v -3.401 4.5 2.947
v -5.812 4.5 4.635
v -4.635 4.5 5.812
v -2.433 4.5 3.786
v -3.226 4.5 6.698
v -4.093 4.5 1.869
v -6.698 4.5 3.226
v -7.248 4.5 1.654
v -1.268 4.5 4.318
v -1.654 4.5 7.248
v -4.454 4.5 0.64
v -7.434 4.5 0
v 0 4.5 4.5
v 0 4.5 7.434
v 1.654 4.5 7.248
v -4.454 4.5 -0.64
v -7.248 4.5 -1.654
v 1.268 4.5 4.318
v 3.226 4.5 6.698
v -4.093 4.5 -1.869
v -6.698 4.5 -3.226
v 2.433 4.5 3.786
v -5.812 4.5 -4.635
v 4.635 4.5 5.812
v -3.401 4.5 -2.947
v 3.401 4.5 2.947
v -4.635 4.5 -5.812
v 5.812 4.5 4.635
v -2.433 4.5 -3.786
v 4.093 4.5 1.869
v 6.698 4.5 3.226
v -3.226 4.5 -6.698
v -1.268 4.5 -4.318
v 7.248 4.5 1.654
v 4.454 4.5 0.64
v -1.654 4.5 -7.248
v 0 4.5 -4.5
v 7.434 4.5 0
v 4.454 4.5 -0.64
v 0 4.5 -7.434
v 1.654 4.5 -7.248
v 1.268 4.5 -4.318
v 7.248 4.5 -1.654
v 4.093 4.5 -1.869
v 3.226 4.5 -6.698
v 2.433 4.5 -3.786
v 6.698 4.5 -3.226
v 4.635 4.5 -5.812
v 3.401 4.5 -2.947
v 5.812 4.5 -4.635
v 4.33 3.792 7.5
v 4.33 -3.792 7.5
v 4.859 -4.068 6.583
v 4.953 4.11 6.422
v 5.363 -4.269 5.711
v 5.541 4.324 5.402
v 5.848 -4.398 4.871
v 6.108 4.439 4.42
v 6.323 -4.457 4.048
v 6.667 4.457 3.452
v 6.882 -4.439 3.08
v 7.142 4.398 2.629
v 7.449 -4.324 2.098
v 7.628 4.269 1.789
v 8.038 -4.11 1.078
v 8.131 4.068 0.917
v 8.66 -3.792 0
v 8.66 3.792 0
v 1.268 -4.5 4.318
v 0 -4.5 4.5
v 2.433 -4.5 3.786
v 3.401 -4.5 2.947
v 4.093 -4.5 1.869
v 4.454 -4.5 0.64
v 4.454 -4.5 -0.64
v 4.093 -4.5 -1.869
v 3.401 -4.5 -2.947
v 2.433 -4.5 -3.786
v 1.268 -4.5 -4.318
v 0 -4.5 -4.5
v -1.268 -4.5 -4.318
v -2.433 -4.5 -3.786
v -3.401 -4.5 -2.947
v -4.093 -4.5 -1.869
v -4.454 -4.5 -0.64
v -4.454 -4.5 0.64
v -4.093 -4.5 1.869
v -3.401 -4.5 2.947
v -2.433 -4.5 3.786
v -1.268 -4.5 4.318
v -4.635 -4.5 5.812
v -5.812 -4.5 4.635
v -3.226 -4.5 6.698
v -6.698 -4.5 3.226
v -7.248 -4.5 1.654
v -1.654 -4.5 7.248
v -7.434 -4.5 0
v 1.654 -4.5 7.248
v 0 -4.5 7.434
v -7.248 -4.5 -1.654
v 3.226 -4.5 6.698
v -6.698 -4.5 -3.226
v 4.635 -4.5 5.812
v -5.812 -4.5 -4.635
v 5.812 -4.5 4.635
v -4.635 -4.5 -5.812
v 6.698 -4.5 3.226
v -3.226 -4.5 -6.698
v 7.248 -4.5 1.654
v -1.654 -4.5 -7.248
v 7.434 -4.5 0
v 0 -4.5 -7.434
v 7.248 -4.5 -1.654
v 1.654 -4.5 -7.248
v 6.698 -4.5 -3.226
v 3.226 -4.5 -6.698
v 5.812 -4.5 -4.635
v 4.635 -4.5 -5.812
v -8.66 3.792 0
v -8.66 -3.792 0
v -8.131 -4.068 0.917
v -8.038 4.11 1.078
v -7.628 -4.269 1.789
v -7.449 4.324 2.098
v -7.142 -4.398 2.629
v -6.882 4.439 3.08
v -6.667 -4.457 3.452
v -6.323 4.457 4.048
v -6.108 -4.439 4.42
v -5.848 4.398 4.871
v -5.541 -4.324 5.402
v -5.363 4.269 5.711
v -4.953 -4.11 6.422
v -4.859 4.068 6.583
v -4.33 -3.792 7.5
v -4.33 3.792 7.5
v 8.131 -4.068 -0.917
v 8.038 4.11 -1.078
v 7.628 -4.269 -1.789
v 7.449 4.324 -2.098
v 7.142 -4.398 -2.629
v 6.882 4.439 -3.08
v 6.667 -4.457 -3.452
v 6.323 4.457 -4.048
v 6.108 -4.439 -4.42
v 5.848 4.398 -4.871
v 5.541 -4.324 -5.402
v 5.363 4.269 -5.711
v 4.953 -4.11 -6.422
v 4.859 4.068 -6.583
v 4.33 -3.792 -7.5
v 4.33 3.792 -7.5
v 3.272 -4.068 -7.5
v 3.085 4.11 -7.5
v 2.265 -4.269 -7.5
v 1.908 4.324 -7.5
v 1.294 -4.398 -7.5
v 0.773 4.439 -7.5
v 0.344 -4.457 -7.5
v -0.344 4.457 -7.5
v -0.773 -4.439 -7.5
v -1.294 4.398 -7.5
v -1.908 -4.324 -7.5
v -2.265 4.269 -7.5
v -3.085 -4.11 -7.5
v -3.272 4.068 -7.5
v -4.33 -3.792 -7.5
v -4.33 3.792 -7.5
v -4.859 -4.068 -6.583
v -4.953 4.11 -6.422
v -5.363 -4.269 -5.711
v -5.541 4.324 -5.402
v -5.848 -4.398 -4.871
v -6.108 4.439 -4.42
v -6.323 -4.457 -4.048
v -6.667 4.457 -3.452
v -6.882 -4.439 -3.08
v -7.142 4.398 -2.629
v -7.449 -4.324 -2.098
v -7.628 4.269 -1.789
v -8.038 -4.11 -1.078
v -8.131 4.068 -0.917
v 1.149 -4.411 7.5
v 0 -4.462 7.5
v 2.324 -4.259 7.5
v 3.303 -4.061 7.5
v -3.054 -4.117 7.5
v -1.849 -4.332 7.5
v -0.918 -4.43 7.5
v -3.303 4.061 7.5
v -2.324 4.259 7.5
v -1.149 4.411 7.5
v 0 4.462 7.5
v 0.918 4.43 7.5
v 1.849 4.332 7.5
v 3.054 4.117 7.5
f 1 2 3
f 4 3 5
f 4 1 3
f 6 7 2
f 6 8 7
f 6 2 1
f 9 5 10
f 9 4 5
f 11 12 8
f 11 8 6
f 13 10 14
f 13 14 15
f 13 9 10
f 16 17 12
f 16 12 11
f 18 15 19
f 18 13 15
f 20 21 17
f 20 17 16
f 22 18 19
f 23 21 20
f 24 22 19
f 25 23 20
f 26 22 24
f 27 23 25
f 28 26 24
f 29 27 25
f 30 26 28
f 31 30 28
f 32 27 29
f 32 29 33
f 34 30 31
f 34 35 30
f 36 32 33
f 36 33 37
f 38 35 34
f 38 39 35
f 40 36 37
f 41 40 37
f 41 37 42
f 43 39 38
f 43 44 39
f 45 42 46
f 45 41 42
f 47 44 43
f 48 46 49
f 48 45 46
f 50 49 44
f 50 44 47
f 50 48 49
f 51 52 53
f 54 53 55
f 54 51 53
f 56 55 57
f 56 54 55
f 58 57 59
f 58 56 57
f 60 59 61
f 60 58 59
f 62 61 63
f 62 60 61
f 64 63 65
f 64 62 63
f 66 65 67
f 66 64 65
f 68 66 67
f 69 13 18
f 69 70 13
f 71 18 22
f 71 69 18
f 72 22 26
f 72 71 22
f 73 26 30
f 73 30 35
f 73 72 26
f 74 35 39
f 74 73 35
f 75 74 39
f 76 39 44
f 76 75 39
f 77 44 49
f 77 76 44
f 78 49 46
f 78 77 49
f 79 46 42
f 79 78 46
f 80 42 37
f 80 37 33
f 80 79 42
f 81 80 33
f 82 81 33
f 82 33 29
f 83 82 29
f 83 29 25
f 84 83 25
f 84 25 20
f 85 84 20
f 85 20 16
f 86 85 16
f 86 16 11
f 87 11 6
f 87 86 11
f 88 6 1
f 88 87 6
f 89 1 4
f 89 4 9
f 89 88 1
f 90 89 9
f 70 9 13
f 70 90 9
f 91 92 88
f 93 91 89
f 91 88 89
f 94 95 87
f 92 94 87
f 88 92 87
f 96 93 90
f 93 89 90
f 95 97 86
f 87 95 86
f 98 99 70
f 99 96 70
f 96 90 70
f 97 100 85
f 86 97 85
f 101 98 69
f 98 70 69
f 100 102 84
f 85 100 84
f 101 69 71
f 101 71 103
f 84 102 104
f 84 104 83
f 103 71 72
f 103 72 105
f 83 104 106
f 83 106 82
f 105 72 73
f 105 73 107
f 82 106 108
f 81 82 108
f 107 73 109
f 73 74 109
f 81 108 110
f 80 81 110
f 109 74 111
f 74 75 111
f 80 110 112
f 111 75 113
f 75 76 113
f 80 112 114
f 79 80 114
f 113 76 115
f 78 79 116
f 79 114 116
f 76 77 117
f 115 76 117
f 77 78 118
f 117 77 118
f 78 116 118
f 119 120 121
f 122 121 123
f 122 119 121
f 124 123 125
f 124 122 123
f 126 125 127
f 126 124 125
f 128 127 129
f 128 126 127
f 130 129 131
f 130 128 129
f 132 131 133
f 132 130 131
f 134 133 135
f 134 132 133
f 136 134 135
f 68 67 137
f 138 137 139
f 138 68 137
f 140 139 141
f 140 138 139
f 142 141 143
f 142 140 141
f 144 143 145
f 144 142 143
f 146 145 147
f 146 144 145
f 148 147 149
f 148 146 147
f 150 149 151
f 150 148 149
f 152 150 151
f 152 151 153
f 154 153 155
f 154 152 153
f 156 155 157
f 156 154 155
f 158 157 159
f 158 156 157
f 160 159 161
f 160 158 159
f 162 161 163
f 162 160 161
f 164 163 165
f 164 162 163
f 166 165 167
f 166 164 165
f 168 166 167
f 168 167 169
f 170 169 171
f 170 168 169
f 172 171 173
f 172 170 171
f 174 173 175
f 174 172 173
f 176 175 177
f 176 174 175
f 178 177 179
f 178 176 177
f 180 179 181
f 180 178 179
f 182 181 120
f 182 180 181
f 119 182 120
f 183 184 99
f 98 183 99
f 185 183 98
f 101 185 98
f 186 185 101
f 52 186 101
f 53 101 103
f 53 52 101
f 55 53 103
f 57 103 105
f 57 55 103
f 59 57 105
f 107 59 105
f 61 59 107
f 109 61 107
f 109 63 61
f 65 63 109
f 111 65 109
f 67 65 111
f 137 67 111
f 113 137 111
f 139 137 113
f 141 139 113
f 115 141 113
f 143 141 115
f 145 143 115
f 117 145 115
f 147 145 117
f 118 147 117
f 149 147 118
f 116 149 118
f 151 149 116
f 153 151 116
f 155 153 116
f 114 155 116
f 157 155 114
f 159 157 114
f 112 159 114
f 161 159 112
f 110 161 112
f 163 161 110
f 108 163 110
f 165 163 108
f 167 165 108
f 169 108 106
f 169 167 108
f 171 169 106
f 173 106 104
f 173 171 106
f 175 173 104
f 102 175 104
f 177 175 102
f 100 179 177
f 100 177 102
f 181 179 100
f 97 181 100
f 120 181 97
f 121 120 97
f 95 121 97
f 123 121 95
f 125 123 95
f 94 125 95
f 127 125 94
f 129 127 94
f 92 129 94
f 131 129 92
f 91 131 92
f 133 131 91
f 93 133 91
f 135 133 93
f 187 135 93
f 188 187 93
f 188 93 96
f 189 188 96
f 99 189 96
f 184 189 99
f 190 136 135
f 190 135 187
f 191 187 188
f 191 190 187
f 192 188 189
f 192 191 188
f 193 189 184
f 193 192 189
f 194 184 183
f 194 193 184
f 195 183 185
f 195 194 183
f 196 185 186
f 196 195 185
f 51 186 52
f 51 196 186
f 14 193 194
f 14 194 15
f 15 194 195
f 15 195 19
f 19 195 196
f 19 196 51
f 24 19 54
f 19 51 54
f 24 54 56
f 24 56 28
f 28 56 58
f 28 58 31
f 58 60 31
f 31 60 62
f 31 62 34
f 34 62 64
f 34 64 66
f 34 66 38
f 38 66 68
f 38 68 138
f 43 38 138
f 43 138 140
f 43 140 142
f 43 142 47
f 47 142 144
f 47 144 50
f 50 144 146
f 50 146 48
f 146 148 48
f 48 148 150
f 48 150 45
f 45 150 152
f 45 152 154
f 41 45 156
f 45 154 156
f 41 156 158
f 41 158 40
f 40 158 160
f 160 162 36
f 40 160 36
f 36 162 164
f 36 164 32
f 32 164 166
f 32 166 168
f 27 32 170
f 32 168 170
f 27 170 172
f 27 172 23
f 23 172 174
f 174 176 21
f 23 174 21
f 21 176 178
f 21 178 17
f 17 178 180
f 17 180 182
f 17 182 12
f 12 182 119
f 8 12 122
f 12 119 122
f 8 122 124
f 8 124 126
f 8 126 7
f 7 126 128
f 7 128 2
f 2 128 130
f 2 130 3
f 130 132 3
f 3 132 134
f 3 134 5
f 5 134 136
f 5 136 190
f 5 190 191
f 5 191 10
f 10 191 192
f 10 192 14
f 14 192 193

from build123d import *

# Parameters (mm, degrees)
SKETCH1_R           = 4.5
BOSS_EXTRUDE1_DEPTH = 4.5


with BuildPart() as part:
    # Sketch1 → Boss-Extrude1 (new body, symmetric)
    with BuildSketch(Plane(origin=(0, 0, 0), x_dir=(1, 0, 0), z_dir=(0, 1, 0))):
        Polygon((8.660254038, 0), (4.330127019, 7.5), (-4.330127019, 7.5), (-8.660254038, 0), (-4.330127019, -7.5), (4.330127019, -7.5), align=None)
        with Locations(Location((0, 0, 0), (0, 0, 270))):  # turned: the seam where the file's is
            Circle(SKETCH1_R, mode=Mode.SUBTRACT)
    extrude(amount=BOSS_EXTRUDE1_DEPTH, both=True)

    # Sketch3 → Cut-Revolve2 (revolve, cut)
    with BuildSketch(Plane(origin=(0, 0, 0), x_dir=(0, 0, -1), z_dir=(1, 0, 0)), mode=Mode.PRIVATE) as cut_revolve2_sk:
        Polygon((4.215565438, 6.358242553), (9.417491766, 3.354908986), (9.417491766, 6.358242553), align=None)
        Polygon((9.417491766, -6.358242553), (4.215565438, -6.358242553), (9.417491766, -3.354908986), align=None)
    revolve(cut_revolve2_sk.sketch.rotate(Axis((0, 0, 0), (0, 1, 0)), 180), axis=Axis((0, 0, 0), (0, 1, 0)), mode=Mode.SUBTRACT)  # turned: the seam where the file's is

    # Sketch2 → Cut-Revolve1 (revolve, cut)
    with BuildSketch(Plane.XY, mode=Mode.PRIVATE) as cut_revolve1_sk:
        Polygon((4.548999988, 6.358242553), (10.760780108, 2.771869628), (10.760780108, 6.358242553), align=None)
        Polygon((10.760780108, -6.358242553), (4.548999988, -6.358242553), (10.760780108, -2.771869628), align=None)
    revolve(cut_revolve1_sk.sketch.rotate(Axis((0, 0, 0), (0, 1, 0)), 270), axis=Axis((0, 0, 0), (0, 1, 0)), mode=Mode.SUBTRACT)  # turned: the seam where the file's is


solid = part.part
